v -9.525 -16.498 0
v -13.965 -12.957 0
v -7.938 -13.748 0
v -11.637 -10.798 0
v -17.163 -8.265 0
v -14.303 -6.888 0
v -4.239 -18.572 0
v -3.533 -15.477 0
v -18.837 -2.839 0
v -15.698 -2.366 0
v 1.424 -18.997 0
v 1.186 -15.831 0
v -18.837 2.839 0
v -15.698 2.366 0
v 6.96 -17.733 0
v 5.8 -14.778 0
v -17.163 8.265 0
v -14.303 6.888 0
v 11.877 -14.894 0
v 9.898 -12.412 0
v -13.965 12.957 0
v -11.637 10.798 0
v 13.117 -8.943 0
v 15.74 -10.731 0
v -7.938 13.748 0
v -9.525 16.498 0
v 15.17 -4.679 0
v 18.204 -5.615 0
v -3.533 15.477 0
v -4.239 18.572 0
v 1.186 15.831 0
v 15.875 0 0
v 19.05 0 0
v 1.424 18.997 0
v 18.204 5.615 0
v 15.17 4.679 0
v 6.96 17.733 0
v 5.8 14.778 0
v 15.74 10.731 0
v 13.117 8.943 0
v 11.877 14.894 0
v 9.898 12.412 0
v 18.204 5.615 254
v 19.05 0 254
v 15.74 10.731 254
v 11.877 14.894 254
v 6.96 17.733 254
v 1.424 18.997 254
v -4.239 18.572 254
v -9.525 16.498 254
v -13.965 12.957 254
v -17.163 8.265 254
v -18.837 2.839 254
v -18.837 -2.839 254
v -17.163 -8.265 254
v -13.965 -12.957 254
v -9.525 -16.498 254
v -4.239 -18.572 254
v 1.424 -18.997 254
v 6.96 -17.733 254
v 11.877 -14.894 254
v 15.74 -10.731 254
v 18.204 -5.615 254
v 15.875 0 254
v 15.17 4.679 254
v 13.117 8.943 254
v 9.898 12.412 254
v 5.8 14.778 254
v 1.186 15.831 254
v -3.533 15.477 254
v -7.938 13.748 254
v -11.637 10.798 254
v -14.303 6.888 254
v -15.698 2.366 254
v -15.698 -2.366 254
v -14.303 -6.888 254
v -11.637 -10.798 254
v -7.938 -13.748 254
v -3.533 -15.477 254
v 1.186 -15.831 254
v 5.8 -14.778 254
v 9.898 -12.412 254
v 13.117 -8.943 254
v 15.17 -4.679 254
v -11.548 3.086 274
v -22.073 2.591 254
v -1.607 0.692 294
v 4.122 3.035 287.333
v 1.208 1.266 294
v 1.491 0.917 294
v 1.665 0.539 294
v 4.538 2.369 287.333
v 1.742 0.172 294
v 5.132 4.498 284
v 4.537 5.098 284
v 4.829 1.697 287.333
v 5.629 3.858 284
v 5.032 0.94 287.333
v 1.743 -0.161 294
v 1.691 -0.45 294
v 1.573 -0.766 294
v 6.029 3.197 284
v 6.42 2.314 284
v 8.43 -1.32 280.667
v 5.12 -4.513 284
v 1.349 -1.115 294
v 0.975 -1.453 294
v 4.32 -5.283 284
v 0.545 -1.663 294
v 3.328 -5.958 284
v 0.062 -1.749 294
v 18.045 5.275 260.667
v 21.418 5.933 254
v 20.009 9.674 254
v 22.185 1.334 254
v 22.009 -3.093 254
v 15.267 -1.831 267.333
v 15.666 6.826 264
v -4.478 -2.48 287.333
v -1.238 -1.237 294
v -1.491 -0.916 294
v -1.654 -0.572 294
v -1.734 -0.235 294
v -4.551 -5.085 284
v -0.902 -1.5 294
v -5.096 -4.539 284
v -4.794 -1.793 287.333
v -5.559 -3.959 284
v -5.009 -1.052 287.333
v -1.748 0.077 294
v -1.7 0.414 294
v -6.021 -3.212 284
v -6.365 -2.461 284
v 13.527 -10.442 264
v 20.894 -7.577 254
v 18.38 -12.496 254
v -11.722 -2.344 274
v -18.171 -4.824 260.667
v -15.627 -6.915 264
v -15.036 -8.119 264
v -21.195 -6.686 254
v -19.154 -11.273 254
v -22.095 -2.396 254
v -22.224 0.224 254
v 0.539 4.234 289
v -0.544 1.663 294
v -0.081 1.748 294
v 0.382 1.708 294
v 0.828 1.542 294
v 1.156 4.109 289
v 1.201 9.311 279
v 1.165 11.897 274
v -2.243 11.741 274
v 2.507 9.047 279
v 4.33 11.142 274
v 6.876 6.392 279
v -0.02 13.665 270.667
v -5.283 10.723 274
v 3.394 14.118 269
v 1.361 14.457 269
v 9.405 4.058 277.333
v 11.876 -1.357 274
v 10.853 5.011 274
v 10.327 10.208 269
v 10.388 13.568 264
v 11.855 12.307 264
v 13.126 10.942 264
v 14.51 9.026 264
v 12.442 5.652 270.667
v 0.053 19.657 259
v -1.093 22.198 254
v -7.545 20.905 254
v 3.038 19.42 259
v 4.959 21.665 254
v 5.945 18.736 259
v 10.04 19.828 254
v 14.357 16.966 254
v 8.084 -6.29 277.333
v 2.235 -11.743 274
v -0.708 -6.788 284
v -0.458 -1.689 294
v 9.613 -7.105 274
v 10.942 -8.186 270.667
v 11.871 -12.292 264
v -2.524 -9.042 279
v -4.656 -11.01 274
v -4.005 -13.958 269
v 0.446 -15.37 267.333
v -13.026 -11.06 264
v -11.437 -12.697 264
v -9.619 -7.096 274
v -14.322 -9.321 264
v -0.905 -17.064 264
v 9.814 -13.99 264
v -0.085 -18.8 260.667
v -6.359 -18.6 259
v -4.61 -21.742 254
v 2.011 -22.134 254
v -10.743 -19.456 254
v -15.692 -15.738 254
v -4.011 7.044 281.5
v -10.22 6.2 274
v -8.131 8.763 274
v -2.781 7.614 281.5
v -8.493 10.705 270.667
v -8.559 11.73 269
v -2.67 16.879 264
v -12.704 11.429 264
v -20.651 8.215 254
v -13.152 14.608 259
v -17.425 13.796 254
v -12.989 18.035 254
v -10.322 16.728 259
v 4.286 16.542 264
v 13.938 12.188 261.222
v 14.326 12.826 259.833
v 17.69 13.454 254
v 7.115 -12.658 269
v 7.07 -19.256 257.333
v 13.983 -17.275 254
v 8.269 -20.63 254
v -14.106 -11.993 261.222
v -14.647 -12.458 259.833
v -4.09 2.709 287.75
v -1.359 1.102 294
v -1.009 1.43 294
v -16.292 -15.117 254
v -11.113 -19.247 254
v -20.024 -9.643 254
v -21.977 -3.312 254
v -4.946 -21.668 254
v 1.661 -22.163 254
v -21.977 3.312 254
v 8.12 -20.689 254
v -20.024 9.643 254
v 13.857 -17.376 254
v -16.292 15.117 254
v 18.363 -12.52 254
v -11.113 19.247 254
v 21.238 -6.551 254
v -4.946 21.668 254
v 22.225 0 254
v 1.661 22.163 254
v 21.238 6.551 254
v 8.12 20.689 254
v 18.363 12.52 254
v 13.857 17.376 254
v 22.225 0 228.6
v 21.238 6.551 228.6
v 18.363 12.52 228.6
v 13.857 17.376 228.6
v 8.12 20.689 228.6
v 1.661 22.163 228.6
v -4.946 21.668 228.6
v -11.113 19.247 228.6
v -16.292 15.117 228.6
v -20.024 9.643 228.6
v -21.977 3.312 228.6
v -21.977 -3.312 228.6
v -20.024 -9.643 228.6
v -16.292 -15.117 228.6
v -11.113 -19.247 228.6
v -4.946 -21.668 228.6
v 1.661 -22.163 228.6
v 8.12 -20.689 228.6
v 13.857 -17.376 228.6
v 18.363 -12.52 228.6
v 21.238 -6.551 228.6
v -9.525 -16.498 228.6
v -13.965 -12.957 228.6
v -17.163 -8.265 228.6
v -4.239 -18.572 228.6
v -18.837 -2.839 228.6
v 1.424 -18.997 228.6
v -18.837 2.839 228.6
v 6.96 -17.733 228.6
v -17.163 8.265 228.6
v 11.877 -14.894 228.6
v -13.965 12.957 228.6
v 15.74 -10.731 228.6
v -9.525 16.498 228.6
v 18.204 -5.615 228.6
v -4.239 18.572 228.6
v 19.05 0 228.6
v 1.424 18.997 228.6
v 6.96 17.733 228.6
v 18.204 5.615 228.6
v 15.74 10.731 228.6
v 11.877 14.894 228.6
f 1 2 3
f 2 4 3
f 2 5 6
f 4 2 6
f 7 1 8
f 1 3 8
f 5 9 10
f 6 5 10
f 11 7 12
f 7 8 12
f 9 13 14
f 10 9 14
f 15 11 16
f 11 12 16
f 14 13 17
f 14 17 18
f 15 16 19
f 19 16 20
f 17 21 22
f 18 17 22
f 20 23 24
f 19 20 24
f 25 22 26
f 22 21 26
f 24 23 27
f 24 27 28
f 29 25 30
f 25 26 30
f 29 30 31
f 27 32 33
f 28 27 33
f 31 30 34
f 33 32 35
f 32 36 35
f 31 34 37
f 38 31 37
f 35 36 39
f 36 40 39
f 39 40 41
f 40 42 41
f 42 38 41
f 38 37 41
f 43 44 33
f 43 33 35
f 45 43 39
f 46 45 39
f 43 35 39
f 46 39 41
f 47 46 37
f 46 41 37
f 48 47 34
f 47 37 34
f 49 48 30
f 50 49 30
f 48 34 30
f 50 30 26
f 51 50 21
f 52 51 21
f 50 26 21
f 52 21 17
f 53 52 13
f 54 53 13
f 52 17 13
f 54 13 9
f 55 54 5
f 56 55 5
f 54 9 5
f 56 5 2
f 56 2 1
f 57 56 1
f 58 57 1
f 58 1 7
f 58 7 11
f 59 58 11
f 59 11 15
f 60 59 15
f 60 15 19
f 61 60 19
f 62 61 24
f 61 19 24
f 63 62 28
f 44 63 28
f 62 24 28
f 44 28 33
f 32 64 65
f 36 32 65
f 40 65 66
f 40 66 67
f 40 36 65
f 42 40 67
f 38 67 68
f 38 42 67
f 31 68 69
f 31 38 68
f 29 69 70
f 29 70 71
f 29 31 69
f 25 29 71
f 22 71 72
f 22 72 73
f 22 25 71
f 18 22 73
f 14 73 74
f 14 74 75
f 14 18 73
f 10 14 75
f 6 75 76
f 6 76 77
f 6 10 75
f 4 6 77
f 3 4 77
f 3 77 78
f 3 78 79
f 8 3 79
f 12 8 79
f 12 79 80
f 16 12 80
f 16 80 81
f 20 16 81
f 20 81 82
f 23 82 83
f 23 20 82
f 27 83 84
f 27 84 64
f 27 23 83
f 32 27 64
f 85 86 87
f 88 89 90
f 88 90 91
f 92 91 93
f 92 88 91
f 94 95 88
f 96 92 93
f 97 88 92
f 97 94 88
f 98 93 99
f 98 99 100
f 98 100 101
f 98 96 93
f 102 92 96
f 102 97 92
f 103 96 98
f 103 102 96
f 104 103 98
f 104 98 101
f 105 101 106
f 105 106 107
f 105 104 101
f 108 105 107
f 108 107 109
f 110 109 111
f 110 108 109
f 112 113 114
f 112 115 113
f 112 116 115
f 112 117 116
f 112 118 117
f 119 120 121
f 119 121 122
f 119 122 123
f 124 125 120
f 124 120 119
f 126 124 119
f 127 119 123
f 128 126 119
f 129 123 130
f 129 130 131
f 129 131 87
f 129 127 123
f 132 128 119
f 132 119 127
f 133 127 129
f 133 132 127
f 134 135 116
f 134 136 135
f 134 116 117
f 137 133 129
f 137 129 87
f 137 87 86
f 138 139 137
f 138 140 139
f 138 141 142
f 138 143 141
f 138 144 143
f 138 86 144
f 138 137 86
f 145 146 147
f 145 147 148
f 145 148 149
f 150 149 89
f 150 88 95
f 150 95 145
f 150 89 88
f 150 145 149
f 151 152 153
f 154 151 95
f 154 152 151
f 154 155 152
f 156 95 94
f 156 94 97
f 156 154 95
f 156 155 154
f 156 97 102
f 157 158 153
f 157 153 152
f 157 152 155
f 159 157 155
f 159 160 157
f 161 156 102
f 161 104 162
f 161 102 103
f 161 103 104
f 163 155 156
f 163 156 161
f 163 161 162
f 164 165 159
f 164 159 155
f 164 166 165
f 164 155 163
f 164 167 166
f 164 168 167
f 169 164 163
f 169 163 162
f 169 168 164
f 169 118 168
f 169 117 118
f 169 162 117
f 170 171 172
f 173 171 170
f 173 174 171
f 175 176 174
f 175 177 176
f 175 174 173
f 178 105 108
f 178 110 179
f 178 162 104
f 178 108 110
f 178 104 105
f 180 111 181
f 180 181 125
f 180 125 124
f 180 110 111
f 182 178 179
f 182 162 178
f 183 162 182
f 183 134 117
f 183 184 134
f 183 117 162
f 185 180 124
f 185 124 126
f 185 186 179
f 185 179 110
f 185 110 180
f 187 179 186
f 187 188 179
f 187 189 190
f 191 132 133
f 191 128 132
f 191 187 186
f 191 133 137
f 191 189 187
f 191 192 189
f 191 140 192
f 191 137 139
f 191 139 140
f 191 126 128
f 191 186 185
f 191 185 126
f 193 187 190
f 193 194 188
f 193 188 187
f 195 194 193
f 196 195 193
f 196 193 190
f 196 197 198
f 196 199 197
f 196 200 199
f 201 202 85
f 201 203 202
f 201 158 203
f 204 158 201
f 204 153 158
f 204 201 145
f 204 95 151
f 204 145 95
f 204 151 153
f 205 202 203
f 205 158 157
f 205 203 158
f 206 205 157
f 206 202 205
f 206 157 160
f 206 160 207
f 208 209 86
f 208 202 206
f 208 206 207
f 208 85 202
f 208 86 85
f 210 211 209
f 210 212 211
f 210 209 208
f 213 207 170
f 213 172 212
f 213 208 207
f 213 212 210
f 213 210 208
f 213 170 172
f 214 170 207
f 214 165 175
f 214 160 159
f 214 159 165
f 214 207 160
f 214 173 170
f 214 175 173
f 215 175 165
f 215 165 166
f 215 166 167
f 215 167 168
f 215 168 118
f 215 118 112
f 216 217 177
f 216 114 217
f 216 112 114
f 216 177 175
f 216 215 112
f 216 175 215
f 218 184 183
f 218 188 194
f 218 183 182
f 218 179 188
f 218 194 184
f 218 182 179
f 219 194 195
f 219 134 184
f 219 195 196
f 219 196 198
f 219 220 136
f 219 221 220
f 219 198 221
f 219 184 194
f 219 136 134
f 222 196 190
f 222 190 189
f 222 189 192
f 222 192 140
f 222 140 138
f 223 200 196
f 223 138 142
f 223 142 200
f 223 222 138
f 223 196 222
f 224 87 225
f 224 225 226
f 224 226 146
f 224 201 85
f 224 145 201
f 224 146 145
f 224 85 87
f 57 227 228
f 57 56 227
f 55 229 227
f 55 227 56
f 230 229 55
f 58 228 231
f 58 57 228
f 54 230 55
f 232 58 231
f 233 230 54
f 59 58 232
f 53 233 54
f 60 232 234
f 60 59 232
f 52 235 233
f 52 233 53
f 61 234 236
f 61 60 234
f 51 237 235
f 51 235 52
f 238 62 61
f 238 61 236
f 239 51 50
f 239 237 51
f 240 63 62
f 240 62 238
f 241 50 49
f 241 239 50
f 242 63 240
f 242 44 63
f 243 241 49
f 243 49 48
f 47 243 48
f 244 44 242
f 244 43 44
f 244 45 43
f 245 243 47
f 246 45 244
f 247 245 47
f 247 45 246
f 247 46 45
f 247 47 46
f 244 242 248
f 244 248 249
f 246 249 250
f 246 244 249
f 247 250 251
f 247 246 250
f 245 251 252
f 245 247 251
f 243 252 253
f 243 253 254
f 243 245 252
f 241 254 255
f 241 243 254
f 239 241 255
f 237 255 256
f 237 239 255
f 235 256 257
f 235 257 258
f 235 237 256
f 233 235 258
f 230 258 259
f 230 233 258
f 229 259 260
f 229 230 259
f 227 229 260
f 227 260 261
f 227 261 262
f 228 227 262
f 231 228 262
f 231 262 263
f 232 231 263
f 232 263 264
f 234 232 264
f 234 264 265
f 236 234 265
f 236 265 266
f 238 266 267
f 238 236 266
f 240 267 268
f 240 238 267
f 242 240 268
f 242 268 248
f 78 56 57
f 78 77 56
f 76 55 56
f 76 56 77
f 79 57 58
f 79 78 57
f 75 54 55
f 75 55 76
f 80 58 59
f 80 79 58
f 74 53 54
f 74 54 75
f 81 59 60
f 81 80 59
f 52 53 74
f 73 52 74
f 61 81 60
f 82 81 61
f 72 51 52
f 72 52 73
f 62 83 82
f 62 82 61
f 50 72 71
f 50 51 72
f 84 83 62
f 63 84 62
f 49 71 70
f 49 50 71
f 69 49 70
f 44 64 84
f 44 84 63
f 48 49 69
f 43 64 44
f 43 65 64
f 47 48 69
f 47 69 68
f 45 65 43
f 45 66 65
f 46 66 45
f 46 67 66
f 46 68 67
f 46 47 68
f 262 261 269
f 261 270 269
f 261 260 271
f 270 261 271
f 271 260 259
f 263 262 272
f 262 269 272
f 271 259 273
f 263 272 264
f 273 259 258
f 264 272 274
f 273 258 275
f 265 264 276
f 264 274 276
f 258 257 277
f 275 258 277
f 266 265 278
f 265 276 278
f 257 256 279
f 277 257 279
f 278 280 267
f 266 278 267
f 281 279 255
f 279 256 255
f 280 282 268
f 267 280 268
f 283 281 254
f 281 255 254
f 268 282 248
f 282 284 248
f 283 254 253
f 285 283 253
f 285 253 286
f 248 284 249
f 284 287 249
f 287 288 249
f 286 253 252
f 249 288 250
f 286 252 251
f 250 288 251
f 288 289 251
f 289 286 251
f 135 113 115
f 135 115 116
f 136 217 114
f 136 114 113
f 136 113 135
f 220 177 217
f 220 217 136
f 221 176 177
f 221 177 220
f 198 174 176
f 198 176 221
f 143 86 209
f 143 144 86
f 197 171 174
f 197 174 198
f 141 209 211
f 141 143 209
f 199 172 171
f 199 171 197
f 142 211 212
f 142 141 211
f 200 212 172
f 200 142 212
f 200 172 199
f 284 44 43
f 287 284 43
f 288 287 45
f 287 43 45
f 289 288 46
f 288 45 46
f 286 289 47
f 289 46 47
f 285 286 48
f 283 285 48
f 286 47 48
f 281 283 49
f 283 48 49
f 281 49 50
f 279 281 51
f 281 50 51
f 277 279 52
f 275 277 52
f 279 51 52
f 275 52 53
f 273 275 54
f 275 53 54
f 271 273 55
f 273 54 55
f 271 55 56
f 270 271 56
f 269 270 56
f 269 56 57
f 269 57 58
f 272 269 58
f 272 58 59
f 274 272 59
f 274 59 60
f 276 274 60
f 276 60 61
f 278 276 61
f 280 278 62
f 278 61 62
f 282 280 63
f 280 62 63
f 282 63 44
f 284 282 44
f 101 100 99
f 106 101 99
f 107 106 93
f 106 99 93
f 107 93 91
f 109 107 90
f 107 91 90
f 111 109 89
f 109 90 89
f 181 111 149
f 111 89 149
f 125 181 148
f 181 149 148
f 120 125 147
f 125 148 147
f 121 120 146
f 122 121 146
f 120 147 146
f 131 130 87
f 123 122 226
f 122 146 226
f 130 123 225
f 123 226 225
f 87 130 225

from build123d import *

# Parameters (mm, degrees)
SKETCH1_R           = 19.05
SKETCH1_R_2         = 15.875
BOSS_EXTRUDE1_DEPTH = 254
SKETCH2_R           = 22.225
SKETCH2_R_2         = 19.05
BOSS_EXTRUDE2_DEPTH = 25.4


with BuildPart() as part:
    # Sketch1 → Boss-Extrude1 (new body)
    with BuildSketch(Plane.XY):
        Circle(SKETCH1_R)
        Circle(SKETCH1_R_2, mode=Mode.SUBTRACT)
    extrude(amount=BOSS_EXTRUDE1_DEPTH)


with BuildPart() as body_2:
    # Sketch2 → Boss-Extrude2 (new body)
    with BuildSketch(Plane.XY.offset(254)):
        Circle(SKETCH2_R)
        Circle(SKETCH2_R_2, mode=Mode.SUBTRACT)
    extrude(amount=-BOSS_EXTRUDE2_DEPTH)


with BuildPart() as body_3:
    # Loft1: read off the stored shape, not the designer's step
    # Loft1: loft between two sections, ruled curve by curve
    loft1_from = [
        Edge.make_bspline([(-1.607377802, 0.691980204, 294), (-0.223417394, 3.906735807, 294), (2.99133821, 2.522775399, 294), (1.607377802, -0.691980204, 294), (0.223417394, -3.906735807, 294), (-2.99133821, -2.522775399, 294), (-1.607377802, 0.691980204, 294)], [0, 0, 0, 0, 0.5, 0.5, 0.5, 1, 1, 1, 1], 3, [1, 0.333333333, 0.333333333, 1, 0.333333333, 0.333333333, 1]),
    ]
    loft1_to = [
        Edge.make_bspline([(-22.073398658, 2.591466124, 254), (-16.890466409, 46.738263441, 254), (27.256330907, 41.555331192, 254), (22.073398658, -2.591466124, 254), (16.890466409, -46.738263441, 254), (-27.256330907, -41.555331192, 254), (-22.073398658, 2.591466124, 254)], [0, 0, 0, 0, 0.5, 0.5, 0.5, 1, 1, 1, 1], 3, [1, 0.333333333, 0.333333333, 1, 0.333333333, 0.333333333, 1]),
    ]
    loft1 = Solid(Shell([*[Face.make_surface_from_curves(loft1_from[k], loft1_to[k]) for k in range(1)], Face(Wire(loft1_from)), Face(Wire(loft1_to))]))
    add(loft1)


solid = Compound([part.part, body_2.part, body_3.part])
